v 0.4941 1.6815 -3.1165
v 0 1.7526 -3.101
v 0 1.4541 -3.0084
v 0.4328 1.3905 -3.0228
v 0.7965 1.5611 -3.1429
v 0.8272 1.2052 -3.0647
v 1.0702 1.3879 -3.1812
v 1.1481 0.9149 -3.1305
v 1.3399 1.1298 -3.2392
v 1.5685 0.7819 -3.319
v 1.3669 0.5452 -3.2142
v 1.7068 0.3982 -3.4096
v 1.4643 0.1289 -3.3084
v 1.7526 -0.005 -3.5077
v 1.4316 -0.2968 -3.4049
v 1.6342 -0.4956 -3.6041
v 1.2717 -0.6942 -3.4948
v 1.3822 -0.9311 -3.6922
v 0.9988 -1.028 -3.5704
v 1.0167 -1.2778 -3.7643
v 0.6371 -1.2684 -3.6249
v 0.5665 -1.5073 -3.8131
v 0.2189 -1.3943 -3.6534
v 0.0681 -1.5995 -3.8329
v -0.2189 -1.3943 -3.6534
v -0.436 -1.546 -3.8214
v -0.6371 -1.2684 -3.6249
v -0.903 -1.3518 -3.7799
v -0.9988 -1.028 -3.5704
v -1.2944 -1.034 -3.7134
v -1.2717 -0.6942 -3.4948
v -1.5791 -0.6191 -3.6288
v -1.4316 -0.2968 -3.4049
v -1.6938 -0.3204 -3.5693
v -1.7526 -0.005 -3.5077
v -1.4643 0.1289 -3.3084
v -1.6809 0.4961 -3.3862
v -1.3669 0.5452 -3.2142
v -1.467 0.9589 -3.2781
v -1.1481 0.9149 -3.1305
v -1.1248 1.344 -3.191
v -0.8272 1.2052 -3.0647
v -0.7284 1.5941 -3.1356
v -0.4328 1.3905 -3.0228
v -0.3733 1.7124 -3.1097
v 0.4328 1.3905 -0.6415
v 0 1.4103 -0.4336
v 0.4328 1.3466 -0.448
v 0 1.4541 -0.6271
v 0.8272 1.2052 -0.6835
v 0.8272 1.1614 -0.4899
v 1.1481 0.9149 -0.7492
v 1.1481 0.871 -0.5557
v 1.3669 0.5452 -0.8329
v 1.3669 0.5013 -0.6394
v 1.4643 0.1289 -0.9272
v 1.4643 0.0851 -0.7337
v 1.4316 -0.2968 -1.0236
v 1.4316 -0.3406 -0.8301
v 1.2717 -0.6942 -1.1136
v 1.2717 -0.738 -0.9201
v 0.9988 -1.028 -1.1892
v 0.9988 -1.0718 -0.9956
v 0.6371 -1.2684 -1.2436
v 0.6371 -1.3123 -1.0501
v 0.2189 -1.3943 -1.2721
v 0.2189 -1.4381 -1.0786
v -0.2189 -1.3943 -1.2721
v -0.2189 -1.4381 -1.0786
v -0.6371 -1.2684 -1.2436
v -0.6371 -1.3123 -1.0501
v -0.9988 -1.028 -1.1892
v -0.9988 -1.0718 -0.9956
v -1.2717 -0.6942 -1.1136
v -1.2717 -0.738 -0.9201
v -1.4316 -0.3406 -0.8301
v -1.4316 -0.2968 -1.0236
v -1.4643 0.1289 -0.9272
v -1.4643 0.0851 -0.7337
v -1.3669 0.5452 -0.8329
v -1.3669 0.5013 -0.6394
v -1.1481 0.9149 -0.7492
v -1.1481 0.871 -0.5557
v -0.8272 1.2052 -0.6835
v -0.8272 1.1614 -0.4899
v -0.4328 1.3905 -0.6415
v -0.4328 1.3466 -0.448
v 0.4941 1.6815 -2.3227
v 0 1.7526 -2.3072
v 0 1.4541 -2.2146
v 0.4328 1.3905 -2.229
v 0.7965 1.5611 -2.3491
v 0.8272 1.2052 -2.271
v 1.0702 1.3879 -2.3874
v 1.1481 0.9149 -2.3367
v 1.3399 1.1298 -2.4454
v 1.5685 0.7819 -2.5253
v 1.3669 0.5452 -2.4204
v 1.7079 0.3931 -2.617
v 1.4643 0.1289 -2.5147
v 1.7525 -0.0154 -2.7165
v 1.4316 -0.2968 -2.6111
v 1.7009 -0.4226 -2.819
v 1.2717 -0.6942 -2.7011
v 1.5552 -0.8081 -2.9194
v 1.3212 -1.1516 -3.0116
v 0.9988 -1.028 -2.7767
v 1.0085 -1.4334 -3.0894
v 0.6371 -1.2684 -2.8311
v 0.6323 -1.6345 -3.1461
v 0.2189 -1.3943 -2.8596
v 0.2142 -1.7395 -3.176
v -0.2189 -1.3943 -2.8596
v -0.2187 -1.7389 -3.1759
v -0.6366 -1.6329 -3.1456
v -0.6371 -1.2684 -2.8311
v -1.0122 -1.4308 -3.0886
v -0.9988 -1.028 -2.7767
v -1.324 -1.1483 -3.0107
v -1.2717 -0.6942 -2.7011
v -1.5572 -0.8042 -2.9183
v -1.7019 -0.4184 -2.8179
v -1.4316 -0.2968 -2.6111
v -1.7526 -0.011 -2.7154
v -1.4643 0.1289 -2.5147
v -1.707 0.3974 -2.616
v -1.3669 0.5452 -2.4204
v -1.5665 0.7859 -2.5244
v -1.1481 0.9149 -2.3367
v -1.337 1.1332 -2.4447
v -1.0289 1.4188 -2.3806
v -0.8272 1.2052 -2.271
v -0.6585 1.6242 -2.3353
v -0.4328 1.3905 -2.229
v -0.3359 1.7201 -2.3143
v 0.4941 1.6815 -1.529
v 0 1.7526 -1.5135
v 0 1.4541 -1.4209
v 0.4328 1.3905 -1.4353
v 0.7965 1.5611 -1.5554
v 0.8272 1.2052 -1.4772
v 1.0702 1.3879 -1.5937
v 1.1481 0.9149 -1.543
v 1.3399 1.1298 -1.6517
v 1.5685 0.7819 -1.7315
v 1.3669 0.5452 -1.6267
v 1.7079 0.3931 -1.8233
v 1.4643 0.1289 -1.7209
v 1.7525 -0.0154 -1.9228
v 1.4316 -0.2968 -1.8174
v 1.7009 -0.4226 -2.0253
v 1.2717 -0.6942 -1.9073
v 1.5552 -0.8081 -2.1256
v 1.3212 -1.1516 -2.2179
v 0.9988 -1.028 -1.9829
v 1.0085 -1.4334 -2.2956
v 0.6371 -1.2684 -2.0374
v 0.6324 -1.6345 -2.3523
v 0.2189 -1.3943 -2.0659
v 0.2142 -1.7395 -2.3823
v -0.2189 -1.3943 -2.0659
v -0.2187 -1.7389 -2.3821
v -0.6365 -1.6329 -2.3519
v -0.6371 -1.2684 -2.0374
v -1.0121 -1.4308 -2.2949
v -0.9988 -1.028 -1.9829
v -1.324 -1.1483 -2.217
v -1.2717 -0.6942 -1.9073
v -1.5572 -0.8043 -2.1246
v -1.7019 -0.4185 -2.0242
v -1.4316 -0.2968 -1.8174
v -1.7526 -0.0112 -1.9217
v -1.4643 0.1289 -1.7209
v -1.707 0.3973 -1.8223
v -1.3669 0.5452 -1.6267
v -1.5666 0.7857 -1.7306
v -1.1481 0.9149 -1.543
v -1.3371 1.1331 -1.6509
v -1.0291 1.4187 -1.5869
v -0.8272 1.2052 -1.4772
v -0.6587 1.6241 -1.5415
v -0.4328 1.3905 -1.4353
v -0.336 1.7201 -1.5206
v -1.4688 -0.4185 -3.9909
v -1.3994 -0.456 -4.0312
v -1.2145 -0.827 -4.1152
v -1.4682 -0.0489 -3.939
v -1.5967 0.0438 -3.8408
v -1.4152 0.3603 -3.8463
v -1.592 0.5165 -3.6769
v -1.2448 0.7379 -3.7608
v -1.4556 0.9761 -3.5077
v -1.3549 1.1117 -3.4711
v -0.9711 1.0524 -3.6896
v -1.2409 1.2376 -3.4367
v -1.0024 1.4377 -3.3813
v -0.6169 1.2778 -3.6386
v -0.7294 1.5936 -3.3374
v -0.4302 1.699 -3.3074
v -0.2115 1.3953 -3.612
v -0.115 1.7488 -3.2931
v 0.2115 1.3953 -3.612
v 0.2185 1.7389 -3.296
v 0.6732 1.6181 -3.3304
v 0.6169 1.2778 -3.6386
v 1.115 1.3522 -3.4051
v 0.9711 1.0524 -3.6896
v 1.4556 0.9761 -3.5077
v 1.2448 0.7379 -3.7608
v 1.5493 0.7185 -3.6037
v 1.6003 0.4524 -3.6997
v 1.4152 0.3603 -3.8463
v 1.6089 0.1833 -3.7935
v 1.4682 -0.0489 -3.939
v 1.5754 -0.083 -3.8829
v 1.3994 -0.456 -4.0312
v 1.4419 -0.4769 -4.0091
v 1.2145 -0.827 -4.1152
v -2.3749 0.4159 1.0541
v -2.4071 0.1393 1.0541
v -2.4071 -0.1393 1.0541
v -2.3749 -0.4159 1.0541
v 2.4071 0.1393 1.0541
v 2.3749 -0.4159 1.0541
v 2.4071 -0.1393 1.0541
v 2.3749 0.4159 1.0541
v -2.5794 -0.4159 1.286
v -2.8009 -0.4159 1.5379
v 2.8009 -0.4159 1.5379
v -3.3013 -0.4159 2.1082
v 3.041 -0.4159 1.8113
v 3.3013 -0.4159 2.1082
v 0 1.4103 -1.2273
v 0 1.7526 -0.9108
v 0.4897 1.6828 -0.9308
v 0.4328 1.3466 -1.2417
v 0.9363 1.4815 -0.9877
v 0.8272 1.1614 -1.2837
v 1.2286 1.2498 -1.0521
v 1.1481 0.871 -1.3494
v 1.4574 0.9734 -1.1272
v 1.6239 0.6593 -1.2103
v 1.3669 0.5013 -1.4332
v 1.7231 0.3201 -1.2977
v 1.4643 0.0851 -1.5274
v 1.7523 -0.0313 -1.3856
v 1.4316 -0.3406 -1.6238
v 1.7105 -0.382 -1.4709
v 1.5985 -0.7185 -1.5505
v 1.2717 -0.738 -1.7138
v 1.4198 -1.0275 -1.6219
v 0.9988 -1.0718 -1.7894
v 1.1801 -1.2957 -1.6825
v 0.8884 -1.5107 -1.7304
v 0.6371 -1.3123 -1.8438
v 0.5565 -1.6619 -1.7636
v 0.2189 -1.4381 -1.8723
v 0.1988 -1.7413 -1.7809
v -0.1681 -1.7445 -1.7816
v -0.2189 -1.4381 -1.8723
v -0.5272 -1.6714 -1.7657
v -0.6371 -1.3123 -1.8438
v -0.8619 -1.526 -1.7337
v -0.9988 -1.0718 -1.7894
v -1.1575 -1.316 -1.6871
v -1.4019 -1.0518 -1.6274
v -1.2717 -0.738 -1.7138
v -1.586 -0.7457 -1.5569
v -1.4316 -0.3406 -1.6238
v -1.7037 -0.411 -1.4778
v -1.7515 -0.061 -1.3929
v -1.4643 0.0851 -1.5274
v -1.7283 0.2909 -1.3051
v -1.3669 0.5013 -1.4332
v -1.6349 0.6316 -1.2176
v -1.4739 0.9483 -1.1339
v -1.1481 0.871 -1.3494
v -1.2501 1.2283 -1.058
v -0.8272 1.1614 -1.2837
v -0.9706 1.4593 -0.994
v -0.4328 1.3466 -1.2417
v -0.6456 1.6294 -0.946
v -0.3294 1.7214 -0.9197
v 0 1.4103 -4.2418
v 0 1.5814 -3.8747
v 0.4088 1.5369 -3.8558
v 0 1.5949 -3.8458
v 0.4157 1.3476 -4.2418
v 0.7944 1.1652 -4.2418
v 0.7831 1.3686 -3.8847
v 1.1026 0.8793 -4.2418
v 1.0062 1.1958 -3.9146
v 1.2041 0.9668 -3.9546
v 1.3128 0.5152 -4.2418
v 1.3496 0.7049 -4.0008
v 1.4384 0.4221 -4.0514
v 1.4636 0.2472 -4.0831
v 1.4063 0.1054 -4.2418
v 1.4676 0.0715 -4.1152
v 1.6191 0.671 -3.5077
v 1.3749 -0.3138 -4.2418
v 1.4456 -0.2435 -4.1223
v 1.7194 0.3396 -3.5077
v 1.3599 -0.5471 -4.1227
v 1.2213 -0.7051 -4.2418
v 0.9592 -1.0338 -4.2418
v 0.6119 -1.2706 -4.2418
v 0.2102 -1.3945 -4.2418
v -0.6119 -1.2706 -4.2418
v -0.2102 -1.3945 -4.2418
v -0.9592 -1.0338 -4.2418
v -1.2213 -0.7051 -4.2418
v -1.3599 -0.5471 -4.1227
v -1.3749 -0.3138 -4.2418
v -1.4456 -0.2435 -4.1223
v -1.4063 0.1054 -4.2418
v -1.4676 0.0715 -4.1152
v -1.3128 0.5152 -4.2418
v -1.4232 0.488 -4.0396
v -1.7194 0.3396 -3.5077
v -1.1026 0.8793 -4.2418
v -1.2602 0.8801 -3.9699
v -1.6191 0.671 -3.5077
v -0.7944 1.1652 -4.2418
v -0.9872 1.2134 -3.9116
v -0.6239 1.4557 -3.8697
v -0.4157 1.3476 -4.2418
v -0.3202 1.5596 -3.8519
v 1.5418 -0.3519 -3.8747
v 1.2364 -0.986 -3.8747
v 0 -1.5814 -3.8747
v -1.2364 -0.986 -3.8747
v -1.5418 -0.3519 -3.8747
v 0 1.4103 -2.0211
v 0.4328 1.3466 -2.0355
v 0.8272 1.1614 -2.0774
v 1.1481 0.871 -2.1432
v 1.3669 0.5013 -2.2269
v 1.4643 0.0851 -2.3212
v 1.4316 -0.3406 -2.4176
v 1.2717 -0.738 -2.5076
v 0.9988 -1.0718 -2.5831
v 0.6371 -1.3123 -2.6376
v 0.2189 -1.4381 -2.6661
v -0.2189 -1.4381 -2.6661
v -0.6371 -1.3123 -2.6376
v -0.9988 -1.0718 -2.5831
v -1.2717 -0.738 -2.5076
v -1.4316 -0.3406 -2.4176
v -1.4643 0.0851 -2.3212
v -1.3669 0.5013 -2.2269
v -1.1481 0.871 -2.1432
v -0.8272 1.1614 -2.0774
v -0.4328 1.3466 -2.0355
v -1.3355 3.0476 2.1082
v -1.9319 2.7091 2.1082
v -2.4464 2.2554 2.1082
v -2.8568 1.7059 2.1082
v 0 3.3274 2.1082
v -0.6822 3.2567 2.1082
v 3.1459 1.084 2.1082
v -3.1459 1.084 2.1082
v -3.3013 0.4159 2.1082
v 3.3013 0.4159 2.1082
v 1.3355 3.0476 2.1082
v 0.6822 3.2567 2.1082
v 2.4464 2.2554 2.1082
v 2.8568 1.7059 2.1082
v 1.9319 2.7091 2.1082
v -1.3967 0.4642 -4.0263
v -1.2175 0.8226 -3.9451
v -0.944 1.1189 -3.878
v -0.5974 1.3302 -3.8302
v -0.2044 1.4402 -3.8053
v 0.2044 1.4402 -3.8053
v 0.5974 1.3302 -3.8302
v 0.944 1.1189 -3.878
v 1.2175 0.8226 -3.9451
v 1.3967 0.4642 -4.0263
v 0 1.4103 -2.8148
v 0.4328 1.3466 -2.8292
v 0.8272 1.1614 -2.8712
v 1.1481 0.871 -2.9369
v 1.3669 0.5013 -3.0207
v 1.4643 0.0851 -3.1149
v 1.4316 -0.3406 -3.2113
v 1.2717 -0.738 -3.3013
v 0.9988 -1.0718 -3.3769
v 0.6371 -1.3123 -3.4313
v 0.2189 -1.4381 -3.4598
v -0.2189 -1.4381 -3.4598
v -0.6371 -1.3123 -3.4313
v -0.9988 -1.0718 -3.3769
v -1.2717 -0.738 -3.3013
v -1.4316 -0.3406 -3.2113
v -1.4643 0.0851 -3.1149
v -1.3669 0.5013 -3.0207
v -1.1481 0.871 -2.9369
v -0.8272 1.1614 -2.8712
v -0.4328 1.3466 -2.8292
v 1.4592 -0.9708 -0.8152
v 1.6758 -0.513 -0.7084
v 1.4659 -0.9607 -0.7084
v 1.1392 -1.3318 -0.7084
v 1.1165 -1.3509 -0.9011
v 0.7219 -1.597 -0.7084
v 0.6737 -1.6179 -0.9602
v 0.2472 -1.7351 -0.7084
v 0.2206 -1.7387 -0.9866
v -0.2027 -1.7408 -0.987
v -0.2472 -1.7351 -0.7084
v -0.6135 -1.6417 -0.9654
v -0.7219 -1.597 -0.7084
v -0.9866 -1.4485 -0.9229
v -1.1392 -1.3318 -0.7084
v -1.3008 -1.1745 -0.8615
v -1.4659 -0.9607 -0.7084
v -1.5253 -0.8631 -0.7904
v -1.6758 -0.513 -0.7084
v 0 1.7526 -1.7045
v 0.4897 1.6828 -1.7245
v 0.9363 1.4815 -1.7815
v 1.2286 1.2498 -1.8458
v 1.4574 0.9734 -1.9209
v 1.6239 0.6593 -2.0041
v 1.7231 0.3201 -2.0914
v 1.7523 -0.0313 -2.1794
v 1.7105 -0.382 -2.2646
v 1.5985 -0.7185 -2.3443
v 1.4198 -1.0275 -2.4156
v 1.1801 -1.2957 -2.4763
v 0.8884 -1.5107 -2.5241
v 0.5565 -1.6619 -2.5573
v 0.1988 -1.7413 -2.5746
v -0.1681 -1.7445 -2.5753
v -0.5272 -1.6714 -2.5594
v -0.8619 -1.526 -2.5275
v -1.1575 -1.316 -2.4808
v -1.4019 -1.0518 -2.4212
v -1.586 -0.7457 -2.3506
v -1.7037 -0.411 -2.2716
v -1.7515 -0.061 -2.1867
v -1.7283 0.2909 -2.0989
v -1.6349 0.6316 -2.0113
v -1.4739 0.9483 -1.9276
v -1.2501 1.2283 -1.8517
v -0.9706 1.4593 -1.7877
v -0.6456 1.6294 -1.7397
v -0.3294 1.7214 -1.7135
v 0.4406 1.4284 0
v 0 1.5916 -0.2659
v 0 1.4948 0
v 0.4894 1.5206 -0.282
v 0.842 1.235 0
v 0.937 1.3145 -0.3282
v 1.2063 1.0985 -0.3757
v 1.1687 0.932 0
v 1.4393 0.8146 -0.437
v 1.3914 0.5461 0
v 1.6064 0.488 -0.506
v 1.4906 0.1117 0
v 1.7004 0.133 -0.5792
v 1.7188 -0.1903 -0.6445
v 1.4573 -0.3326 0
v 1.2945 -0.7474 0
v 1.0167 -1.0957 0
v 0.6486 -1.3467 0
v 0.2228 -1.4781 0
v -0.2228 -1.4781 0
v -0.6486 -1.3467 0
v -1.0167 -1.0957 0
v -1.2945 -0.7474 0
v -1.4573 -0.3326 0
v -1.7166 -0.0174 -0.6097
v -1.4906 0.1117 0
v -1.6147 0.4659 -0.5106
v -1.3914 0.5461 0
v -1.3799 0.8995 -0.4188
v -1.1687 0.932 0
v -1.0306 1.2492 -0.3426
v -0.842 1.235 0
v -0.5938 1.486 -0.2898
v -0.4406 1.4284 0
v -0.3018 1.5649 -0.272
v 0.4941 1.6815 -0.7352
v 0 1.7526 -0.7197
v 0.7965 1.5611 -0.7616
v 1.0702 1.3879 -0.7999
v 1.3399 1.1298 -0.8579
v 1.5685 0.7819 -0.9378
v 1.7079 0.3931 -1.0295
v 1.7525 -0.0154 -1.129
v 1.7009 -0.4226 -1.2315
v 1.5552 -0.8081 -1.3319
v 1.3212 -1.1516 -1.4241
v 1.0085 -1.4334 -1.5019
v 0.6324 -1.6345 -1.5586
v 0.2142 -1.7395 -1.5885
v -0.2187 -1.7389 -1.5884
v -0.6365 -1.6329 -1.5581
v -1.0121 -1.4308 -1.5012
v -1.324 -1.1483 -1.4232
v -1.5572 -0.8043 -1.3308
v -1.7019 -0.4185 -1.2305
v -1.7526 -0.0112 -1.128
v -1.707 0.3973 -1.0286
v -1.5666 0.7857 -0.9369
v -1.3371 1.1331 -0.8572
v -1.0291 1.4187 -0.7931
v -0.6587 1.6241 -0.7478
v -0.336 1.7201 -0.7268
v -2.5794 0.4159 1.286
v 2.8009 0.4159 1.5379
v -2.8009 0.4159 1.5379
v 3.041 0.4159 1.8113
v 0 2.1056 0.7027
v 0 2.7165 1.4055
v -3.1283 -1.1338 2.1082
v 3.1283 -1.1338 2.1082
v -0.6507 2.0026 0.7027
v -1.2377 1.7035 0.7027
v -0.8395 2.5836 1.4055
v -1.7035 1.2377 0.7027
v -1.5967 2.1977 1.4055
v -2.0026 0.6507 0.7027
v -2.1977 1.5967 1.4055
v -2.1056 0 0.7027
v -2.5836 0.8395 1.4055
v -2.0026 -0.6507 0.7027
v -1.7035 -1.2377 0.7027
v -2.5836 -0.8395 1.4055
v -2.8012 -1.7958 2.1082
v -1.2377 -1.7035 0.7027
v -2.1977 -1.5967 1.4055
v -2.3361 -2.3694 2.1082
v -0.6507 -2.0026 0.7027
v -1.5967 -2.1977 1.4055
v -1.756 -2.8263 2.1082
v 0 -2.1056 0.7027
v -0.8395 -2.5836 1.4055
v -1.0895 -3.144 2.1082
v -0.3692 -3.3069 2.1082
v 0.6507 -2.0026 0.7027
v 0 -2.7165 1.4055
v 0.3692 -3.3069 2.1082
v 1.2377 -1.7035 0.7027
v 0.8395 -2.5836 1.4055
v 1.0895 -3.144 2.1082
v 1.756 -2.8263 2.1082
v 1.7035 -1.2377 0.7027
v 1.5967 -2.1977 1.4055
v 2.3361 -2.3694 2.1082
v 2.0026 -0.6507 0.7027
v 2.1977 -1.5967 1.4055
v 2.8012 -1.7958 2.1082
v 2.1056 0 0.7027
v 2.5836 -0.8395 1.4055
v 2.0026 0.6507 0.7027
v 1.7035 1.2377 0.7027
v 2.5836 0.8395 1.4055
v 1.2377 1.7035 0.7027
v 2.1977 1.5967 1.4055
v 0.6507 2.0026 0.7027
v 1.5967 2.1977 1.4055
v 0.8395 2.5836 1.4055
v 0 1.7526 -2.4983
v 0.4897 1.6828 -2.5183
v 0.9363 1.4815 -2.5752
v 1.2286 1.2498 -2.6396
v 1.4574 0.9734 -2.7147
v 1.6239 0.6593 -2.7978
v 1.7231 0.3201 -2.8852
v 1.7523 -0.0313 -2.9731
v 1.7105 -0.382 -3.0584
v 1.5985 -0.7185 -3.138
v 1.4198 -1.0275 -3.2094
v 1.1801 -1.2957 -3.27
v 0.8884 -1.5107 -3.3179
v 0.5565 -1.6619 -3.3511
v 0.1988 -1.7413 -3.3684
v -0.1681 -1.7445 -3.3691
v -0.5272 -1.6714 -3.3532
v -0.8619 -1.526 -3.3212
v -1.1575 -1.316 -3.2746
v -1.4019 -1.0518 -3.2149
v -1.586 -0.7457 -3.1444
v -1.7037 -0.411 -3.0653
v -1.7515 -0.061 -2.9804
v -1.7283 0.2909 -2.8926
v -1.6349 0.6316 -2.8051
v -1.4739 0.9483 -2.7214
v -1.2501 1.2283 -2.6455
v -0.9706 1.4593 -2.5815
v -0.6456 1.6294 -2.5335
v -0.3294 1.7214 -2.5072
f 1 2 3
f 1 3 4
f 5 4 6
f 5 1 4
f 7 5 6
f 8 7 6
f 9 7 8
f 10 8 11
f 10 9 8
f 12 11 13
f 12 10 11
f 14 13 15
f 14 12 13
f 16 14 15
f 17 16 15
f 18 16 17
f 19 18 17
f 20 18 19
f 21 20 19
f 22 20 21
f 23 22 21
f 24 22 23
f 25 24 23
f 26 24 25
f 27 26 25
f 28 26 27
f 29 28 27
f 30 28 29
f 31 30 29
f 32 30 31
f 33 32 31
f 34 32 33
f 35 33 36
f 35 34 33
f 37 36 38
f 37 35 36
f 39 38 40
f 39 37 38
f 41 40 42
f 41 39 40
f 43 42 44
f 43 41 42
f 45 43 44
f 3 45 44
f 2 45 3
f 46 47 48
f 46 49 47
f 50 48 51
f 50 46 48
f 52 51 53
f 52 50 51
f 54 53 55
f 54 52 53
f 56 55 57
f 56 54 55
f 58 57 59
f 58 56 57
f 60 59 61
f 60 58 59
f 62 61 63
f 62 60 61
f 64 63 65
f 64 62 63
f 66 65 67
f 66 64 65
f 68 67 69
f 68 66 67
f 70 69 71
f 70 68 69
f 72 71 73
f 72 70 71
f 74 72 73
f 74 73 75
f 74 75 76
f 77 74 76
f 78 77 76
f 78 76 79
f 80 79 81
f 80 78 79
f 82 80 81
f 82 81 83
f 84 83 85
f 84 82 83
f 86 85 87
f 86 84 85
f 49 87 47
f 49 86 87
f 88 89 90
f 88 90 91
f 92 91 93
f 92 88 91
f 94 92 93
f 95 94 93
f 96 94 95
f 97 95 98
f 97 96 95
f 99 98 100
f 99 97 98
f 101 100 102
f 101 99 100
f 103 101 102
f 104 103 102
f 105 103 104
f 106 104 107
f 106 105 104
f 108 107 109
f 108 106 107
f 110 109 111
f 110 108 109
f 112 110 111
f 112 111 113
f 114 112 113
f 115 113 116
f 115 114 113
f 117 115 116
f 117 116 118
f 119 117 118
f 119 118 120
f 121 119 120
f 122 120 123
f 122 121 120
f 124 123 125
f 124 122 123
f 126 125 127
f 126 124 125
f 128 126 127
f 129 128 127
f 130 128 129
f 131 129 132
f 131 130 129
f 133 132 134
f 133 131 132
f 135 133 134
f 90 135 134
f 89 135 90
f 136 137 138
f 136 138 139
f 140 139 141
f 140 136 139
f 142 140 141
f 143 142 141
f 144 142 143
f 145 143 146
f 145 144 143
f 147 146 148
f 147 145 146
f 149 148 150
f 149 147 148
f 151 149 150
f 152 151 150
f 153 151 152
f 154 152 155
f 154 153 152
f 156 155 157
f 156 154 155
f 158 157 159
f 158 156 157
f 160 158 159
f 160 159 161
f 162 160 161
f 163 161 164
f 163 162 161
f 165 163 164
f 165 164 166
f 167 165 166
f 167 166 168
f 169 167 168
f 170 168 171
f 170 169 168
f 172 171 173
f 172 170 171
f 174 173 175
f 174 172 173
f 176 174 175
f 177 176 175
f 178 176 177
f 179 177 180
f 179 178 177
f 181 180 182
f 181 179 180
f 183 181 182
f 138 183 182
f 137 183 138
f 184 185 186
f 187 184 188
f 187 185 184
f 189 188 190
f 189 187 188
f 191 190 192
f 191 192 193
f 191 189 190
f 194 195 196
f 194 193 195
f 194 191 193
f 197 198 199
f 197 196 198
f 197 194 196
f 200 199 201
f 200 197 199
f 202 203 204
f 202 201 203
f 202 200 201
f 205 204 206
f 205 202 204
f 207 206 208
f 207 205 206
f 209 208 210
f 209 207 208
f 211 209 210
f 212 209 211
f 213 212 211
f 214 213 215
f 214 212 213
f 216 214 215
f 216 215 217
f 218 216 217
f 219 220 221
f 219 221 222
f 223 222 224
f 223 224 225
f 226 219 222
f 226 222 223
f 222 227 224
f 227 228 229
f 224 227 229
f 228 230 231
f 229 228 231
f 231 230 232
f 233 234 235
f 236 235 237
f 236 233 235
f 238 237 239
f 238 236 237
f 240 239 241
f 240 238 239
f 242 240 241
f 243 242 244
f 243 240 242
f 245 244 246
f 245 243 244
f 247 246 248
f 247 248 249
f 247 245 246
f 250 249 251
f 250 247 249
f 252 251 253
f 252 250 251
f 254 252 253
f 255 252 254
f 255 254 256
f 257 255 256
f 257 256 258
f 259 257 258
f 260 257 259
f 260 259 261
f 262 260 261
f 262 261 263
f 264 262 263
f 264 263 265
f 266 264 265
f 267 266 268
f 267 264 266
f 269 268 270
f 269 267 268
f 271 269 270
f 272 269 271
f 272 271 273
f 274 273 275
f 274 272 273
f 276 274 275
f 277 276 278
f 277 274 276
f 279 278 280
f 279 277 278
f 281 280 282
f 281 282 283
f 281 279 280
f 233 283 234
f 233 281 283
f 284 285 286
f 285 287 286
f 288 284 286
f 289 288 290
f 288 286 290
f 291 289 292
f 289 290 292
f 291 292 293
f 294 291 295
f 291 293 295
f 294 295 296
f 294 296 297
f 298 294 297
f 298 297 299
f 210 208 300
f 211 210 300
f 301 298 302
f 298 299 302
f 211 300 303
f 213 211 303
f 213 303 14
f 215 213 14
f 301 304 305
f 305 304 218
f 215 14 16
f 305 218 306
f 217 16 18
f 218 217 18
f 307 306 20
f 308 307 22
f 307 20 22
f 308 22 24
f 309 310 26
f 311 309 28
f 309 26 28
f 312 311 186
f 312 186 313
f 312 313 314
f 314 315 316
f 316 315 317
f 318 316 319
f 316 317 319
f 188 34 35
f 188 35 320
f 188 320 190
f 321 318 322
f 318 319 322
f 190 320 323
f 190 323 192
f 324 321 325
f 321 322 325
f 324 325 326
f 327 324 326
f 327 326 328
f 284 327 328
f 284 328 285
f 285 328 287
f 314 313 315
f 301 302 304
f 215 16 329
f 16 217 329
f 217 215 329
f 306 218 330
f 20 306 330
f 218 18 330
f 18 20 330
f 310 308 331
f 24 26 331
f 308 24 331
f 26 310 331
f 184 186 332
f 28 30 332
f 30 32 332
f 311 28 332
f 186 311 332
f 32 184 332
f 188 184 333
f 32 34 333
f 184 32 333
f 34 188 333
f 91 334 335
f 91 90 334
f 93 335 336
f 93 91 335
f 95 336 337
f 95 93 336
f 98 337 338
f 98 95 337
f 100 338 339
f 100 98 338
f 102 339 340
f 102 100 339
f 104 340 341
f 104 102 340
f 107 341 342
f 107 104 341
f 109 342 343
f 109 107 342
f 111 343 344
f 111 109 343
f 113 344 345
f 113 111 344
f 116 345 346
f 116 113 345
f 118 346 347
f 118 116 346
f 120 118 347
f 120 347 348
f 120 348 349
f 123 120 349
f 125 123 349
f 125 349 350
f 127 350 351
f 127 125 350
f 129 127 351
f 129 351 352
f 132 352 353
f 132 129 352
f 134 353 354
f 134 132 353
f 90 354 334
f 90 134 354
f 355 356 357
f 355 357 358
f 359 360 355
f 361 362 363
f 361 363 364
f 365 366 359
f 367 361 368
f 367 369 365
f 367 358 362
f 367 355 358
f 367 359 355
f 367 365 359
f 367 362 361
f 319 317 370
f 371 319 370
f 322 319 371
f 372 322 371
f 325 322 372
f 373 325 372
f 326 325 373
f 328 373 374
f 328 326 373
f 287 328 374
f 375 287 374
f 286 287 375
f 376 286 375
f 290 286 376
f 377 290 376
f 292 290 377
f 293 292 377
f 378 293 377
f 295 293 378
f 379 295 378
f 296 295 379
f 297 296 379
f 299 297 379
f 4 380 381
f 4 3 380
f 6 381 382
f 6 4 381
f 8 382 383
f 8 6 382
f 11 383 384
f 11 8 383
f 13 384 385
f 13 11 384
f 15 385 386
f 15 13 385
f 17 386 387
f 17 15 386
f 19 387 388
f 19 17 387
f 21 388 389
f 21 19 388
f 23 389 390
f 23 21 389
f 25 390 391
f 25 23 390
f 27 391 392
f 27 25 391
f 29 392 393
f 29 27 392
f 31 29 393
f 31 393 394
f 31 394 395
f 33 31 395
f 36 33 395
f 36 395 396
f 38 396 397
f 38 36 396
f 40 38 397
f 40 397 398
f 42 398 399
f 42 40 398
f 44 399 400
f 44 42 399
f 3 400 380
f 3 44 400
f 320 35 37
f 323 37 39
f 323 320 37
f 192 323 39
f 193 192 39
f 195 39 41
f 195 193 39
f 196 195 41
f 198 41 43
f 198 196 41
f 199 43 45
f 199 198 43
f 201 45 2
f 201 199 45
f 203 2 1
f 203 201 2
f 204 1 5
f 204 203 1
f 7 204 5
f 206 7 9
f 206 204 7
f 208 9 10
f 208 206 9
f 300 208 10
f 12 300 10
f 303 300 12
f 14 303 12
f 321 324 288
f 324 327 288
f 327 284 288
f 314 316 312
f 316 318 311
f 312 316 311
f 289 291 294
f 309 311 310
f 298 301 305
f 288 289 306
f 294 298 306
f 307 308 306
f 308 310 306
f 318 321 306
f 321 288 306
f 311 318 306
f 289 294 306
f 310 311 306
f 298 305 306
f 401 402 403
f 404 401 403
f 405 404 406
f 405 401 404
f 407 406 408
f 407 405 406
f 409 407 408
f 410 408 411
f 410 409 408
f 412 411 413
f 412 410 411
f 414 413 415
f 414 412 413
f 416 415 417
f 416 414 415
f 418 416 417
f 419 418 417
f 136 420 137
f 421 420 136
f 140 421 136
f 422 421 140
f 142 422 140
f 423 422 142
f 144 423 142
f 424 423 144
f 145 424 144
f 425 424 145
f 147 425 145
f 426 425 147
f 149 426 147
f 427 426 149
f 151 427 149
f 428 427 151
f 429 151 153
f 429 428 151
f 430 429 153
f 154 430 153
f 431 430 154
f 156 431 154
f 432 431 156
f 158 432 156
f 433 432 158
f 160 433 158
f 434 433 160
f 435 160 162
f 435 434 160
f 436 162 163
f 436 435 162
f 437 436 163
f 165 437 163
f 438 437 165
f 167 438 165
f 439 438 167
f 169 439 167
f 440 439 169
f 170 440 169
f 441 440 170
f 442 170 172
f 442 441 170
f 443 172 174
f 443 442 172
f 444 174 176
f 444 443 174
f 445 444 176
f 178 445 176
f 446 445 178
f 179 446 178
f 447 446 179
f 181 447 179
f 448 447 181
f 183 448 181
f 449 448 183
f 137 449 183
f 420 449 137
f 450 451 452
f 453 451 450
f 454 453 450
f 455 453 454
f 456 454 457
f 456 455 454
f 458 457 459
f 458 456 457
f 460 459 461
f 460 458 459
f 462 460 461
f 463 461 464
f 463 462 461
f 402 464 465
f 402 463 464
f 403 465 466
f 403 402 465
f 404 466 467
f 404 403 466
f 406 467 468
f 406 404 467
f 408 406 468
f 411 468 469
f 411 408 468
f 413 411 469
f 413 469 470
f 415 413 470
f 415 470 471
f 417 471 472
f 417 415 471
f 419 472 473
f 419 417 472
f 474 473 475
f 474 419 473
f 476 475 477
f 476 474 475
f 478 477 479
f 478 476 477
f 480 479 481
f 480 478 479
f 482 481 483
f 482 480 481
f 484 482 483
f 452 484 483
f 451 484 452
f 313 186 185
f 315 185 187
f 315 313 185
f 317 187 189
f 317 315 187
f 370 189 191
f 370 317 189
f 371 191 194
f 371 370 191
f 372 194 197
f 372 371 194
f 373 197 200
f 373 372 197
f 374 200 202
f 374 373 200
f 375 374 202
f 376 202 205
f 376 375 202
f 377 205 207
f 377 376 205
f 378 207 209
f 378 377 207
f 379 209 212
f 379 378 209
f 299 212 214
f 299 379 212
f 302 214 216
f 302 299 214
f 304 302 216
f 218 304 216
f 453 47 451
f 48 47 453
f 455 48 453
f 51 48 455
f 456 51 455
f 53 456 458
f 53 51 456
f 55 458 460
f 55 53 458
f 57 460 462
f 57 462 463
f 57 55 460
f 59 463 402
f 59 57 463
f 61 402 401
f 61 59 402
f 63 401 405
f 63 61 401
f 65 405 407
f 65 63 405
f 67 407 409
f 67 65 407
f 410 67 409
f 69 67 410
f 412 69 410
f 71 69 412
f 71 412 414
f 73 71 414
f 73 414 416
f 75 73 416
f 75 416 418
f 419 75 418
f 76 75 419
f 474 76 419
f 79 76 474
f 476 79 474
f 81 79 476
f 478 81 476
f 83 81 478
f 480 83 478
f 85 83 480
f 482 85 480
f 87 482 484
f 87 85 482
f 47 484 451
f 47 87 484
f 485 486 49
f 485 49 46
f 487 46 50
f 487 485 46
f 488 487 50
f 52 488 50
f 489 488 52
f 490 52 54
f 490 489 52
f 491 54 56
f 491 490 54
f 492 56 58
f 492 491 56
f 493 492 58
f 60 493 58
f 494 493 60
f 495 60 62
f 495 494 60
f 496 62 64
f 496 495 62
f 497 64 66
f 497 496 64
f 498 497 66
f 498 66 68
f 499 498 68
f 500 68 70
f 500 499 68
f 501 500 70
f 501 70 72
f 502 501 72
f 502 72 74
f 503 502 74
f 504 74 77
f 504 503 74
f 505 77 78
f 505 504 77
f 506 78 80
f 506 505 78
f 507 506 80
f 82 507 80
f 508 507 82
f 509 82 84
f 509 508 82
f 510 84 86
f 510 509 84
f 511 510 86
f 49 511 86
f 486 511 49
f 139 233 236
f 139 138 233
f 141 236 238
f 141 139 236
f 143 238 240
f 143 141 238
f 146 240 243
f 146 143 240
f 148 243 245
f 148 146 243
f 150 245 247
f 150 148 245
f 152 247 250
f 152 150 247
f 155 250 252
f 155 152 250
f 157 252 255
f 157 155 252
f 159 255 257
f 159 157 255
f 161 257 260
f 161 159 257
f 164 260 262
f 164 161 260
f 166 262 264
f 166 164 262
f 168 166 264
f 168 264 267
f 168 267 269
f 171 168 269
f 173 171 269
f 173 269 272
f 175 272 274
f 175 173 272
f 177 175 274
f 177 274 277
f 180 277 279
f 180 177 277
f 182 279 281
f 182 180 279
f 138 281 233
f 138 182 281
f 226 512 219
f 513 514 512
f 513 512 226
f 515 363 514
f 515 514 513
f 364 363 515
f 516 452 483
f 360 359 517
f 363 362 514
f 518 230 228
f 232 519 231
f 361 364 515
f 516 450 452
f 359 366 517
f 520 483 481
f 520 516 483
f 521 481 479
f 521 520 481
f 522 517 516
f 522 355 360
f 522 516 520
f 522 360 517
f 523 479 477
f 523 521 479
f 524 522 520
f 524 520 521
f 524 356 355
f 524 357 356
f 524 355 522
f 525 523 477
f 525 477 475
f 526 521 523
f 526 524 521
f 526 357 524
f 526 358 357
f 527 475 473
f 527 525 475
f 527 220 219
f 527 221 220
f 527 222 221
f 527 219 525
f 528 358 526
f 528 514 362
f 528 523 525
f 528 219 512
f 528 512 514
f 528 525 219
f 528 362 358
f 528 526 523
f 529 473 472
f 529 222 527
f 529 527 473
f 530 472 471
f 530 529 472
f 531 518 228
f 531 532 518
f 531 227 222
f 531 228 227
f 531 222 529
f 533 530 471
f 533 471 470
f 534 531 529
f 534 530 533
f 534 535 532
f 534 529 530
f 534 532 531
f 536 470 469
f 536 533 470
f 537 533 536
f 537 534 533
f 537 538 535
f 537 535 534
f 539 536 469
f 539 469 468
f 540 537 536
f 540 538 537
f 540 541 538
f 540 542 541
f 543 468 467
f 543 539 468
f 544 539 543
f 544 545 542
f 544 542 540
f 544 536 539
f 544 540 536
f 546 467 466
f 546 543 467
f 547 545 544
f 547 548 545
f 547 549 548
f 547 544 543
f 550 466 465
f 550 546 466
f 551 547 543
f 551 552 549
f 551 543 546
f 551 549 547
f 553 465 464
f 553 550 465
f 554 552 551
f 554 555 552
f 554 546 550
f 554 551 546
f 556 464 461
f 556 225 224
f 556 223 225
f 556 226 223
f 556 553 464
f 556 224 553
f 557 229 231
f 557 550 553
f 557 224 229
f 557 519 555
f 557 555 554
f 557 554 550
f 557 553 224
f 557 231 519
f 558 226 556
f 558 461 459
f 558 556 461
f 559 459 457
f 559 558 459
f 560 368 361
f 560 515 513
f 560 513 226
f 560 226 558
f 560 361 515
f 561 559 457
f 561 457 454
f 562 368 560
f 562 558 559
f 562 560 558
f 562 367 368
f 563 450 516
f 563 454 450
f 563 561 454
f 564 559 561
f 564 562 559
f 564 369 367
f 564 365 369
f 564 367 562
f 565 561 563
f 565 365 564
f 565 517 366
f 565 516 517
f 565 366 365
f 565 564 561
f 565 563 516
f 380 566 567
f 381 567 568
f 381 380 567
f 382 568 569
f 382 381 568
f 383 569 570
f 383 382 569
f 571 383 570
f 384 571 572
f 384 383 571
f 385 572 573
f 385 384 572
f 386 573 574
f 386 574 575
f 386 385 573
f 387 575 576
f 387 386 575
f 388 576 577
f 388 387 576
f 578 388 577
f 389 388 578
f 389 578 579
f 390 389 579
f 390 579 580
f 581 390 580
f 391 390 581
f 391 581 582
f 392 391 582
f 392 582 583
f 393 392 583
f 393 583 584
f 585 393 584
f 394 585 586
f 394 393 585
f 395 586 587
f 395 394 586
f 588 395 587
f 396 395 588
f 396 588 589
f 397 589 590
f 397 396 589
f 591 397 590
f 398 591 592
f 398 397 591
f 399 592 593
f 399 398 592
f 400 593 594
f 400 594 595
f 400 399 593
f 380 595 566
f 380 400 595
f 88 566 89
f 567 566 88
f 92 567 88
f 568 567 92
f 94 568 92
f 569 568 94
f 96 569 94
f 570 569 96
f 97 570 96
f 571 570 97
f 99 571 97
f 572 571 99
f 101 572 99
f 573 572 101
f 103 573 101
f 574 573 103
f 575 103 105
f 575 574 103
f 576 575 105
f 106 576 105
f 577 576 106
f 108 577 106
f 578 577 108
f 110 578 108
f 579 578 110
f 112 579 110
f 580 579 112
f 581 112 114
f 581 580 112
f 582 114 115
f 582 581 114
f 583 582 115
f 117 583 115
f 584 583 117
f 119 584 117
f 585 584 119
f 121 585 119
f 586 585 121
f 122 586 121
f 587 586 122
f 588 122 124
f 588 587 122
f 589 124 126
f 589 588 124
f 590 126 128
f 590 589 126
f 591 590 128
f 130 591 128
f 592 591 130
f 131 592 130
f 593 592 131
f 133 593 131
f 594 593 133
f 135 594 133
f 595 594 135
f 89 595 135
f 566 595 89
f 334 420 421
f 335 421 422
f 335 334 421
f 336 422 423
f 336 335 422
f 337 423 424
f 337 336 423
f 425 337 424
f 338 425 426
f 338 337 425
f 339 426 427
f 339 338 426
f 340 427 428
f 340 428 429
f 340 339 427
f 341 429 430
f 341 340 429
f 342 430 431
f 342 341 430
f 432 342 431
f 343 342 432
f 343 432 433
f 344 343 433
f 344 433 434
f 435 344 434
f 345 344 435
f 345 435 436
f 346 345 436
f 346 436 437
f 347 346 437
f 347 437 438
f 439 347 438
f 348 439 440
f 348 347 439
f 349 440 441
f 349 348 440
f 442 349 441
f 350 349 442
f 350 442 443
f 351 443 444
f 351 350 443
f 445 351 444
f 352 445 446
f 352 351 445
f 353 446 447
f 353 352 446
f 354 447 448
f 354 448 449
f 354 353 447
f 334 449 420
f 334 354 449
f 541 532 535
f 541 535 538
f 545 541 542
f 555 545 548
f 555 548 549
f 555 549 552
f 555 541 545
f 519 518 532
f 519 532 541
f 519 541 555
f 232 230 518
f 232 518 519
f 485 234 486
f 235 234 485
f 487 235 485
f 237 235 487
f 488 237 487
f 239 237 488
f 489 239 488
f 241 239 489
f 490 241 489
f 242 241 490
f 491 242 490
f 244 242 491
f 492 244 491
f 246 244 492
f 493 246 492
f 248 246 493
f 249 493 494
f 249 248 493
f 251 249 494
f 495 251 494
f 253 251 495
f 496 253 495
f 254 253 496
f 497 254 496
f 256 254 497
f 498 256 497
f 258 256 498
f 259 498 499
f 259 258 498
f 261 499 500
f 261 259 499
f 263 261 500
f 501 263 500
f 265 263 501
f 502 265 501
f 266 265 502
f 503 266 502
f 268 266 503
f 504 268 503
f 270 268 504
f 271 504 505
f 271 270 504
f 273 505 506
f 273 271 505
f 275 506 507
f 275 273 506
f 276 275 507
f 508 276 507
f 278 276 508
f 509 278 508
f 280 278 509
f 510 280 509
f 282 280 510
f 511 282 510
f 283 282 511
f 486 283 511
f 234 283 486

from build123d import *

# Parameters (mm, degrees)
SKETCH1_R          = 3.3274
EXTRUDE3_DEPTH     = 2.1082
SKETCH4_W          = 4.2418
SKETCH4_H          = 1.7526
LPATTERN2_COUNT    = 5
LPATTERN2_PITCH    = 0.79375
SKETCH15_W         = 6.6548
SKETCH15_H         = 0.83185
CUT_EXTRUDE5_DEPTH = 1.0541


with BuildPart() as part:
    # Sketch1 → Extrude3 (new body)
    with BuildSketch(Plane.XY):
        Circle(SKETCH1_R)
    extrude(amount=EXTRUDE3_DEPTH)

    # Sketch11 → Cut-Revolve3 (revolve, cut)
    with BuildSketch(Plane(origin=(0, 0, 0), x_dir=(0, 0, -1), z_dir=(1, 0, 0))):
        Polygon((0, 1.494769699), (-2.1082, 3.3274), (0, 3.3274), align=None)
    revolve(axis=Axis((0, 0, -0.441444004), (0, 0, 1)), mode=Mode.SUBTRACT)

    # Sketch4 → Revolve1 (revolve)
    with BuildSketch(Plane(origin=(0, 0, 0), x_dir=(0, 0, -1), z_dir=(1, 0, 0))):
        with Locations((2.1209, 0.8763)):
            Rectangle(SKETCH4_W, SKETCH4_H)
    revolve(axis=Axis((0, 0, -4.2418), (0, 0, -1)))

    # Sketch5 → Cut-Revolve1 (revolve, cut)
    with BuildSketch(Plane(origin=(0, 0, 0), x_dir=(0, 0, -1), z_dir=(1, 0, 0))):
        Polygon((0.096768654, 1.774513192), (0.433577192, 1.410275607), (0.6271145, 1.454101991), (0.774149232, 1.927905533), align=None)
    cut_revolve1 = revolve(axis=Axis((0, -0.193538035, 0), (0, 0.220857364, -0.975306119)), mode=Mode.SUBTRACT)

    # Sketch13 → Cut-Revolve4 (revolve, cut)
    with BuildSketch(Plane(origin=(0, 0, 0), x_dir=(0, 0, -1), z_dir=(1, 0, 0))):
        Polygon((4.2418, 1.410275607), (3.507682971, 1.7526), (4.2418, 1.7526), align=None)
    revolve(axis=Axis((0, 0, 0), (0, 0, -1)), mode=Mode.SUBTRACT)

    # Sketch16 → Cut-Revolve5 (revolve, cut)
    with BuildSketch(Plane(origin=(0, 0, 0), x_dir=(0, 0, -1), z_dir=(1, 0, 0))):
        Polygon((0, 1.494769699), (0.708382929, 1.7526), (0, 1.7526), align=None)
    revolve(axis=Axis((0, 0, 0), (0, 0, -1)), mode=Mode.SUBTRACT)

    # LPattern2: Cut-Revolve1 ×5
    with Locations(*[(0, 0, -i * LPATTERN2_PITCH) for i in range(1, LPATTERN2_COUNT)]):
        add(cut_revolve1, mode=Mode.SUBTRACT)

    # Sketch15 → Cut-Extrude5 (cut)
    with BuildSketch(Plane.XY.offset(2.1082)):
        Rectangle(SKETCH15_W, SKETCH15_H)
    extrude(amount=-CUT_EXTRUDE5_DEPTH, mode=Mode.SUBTRACT)


solid = part.part
